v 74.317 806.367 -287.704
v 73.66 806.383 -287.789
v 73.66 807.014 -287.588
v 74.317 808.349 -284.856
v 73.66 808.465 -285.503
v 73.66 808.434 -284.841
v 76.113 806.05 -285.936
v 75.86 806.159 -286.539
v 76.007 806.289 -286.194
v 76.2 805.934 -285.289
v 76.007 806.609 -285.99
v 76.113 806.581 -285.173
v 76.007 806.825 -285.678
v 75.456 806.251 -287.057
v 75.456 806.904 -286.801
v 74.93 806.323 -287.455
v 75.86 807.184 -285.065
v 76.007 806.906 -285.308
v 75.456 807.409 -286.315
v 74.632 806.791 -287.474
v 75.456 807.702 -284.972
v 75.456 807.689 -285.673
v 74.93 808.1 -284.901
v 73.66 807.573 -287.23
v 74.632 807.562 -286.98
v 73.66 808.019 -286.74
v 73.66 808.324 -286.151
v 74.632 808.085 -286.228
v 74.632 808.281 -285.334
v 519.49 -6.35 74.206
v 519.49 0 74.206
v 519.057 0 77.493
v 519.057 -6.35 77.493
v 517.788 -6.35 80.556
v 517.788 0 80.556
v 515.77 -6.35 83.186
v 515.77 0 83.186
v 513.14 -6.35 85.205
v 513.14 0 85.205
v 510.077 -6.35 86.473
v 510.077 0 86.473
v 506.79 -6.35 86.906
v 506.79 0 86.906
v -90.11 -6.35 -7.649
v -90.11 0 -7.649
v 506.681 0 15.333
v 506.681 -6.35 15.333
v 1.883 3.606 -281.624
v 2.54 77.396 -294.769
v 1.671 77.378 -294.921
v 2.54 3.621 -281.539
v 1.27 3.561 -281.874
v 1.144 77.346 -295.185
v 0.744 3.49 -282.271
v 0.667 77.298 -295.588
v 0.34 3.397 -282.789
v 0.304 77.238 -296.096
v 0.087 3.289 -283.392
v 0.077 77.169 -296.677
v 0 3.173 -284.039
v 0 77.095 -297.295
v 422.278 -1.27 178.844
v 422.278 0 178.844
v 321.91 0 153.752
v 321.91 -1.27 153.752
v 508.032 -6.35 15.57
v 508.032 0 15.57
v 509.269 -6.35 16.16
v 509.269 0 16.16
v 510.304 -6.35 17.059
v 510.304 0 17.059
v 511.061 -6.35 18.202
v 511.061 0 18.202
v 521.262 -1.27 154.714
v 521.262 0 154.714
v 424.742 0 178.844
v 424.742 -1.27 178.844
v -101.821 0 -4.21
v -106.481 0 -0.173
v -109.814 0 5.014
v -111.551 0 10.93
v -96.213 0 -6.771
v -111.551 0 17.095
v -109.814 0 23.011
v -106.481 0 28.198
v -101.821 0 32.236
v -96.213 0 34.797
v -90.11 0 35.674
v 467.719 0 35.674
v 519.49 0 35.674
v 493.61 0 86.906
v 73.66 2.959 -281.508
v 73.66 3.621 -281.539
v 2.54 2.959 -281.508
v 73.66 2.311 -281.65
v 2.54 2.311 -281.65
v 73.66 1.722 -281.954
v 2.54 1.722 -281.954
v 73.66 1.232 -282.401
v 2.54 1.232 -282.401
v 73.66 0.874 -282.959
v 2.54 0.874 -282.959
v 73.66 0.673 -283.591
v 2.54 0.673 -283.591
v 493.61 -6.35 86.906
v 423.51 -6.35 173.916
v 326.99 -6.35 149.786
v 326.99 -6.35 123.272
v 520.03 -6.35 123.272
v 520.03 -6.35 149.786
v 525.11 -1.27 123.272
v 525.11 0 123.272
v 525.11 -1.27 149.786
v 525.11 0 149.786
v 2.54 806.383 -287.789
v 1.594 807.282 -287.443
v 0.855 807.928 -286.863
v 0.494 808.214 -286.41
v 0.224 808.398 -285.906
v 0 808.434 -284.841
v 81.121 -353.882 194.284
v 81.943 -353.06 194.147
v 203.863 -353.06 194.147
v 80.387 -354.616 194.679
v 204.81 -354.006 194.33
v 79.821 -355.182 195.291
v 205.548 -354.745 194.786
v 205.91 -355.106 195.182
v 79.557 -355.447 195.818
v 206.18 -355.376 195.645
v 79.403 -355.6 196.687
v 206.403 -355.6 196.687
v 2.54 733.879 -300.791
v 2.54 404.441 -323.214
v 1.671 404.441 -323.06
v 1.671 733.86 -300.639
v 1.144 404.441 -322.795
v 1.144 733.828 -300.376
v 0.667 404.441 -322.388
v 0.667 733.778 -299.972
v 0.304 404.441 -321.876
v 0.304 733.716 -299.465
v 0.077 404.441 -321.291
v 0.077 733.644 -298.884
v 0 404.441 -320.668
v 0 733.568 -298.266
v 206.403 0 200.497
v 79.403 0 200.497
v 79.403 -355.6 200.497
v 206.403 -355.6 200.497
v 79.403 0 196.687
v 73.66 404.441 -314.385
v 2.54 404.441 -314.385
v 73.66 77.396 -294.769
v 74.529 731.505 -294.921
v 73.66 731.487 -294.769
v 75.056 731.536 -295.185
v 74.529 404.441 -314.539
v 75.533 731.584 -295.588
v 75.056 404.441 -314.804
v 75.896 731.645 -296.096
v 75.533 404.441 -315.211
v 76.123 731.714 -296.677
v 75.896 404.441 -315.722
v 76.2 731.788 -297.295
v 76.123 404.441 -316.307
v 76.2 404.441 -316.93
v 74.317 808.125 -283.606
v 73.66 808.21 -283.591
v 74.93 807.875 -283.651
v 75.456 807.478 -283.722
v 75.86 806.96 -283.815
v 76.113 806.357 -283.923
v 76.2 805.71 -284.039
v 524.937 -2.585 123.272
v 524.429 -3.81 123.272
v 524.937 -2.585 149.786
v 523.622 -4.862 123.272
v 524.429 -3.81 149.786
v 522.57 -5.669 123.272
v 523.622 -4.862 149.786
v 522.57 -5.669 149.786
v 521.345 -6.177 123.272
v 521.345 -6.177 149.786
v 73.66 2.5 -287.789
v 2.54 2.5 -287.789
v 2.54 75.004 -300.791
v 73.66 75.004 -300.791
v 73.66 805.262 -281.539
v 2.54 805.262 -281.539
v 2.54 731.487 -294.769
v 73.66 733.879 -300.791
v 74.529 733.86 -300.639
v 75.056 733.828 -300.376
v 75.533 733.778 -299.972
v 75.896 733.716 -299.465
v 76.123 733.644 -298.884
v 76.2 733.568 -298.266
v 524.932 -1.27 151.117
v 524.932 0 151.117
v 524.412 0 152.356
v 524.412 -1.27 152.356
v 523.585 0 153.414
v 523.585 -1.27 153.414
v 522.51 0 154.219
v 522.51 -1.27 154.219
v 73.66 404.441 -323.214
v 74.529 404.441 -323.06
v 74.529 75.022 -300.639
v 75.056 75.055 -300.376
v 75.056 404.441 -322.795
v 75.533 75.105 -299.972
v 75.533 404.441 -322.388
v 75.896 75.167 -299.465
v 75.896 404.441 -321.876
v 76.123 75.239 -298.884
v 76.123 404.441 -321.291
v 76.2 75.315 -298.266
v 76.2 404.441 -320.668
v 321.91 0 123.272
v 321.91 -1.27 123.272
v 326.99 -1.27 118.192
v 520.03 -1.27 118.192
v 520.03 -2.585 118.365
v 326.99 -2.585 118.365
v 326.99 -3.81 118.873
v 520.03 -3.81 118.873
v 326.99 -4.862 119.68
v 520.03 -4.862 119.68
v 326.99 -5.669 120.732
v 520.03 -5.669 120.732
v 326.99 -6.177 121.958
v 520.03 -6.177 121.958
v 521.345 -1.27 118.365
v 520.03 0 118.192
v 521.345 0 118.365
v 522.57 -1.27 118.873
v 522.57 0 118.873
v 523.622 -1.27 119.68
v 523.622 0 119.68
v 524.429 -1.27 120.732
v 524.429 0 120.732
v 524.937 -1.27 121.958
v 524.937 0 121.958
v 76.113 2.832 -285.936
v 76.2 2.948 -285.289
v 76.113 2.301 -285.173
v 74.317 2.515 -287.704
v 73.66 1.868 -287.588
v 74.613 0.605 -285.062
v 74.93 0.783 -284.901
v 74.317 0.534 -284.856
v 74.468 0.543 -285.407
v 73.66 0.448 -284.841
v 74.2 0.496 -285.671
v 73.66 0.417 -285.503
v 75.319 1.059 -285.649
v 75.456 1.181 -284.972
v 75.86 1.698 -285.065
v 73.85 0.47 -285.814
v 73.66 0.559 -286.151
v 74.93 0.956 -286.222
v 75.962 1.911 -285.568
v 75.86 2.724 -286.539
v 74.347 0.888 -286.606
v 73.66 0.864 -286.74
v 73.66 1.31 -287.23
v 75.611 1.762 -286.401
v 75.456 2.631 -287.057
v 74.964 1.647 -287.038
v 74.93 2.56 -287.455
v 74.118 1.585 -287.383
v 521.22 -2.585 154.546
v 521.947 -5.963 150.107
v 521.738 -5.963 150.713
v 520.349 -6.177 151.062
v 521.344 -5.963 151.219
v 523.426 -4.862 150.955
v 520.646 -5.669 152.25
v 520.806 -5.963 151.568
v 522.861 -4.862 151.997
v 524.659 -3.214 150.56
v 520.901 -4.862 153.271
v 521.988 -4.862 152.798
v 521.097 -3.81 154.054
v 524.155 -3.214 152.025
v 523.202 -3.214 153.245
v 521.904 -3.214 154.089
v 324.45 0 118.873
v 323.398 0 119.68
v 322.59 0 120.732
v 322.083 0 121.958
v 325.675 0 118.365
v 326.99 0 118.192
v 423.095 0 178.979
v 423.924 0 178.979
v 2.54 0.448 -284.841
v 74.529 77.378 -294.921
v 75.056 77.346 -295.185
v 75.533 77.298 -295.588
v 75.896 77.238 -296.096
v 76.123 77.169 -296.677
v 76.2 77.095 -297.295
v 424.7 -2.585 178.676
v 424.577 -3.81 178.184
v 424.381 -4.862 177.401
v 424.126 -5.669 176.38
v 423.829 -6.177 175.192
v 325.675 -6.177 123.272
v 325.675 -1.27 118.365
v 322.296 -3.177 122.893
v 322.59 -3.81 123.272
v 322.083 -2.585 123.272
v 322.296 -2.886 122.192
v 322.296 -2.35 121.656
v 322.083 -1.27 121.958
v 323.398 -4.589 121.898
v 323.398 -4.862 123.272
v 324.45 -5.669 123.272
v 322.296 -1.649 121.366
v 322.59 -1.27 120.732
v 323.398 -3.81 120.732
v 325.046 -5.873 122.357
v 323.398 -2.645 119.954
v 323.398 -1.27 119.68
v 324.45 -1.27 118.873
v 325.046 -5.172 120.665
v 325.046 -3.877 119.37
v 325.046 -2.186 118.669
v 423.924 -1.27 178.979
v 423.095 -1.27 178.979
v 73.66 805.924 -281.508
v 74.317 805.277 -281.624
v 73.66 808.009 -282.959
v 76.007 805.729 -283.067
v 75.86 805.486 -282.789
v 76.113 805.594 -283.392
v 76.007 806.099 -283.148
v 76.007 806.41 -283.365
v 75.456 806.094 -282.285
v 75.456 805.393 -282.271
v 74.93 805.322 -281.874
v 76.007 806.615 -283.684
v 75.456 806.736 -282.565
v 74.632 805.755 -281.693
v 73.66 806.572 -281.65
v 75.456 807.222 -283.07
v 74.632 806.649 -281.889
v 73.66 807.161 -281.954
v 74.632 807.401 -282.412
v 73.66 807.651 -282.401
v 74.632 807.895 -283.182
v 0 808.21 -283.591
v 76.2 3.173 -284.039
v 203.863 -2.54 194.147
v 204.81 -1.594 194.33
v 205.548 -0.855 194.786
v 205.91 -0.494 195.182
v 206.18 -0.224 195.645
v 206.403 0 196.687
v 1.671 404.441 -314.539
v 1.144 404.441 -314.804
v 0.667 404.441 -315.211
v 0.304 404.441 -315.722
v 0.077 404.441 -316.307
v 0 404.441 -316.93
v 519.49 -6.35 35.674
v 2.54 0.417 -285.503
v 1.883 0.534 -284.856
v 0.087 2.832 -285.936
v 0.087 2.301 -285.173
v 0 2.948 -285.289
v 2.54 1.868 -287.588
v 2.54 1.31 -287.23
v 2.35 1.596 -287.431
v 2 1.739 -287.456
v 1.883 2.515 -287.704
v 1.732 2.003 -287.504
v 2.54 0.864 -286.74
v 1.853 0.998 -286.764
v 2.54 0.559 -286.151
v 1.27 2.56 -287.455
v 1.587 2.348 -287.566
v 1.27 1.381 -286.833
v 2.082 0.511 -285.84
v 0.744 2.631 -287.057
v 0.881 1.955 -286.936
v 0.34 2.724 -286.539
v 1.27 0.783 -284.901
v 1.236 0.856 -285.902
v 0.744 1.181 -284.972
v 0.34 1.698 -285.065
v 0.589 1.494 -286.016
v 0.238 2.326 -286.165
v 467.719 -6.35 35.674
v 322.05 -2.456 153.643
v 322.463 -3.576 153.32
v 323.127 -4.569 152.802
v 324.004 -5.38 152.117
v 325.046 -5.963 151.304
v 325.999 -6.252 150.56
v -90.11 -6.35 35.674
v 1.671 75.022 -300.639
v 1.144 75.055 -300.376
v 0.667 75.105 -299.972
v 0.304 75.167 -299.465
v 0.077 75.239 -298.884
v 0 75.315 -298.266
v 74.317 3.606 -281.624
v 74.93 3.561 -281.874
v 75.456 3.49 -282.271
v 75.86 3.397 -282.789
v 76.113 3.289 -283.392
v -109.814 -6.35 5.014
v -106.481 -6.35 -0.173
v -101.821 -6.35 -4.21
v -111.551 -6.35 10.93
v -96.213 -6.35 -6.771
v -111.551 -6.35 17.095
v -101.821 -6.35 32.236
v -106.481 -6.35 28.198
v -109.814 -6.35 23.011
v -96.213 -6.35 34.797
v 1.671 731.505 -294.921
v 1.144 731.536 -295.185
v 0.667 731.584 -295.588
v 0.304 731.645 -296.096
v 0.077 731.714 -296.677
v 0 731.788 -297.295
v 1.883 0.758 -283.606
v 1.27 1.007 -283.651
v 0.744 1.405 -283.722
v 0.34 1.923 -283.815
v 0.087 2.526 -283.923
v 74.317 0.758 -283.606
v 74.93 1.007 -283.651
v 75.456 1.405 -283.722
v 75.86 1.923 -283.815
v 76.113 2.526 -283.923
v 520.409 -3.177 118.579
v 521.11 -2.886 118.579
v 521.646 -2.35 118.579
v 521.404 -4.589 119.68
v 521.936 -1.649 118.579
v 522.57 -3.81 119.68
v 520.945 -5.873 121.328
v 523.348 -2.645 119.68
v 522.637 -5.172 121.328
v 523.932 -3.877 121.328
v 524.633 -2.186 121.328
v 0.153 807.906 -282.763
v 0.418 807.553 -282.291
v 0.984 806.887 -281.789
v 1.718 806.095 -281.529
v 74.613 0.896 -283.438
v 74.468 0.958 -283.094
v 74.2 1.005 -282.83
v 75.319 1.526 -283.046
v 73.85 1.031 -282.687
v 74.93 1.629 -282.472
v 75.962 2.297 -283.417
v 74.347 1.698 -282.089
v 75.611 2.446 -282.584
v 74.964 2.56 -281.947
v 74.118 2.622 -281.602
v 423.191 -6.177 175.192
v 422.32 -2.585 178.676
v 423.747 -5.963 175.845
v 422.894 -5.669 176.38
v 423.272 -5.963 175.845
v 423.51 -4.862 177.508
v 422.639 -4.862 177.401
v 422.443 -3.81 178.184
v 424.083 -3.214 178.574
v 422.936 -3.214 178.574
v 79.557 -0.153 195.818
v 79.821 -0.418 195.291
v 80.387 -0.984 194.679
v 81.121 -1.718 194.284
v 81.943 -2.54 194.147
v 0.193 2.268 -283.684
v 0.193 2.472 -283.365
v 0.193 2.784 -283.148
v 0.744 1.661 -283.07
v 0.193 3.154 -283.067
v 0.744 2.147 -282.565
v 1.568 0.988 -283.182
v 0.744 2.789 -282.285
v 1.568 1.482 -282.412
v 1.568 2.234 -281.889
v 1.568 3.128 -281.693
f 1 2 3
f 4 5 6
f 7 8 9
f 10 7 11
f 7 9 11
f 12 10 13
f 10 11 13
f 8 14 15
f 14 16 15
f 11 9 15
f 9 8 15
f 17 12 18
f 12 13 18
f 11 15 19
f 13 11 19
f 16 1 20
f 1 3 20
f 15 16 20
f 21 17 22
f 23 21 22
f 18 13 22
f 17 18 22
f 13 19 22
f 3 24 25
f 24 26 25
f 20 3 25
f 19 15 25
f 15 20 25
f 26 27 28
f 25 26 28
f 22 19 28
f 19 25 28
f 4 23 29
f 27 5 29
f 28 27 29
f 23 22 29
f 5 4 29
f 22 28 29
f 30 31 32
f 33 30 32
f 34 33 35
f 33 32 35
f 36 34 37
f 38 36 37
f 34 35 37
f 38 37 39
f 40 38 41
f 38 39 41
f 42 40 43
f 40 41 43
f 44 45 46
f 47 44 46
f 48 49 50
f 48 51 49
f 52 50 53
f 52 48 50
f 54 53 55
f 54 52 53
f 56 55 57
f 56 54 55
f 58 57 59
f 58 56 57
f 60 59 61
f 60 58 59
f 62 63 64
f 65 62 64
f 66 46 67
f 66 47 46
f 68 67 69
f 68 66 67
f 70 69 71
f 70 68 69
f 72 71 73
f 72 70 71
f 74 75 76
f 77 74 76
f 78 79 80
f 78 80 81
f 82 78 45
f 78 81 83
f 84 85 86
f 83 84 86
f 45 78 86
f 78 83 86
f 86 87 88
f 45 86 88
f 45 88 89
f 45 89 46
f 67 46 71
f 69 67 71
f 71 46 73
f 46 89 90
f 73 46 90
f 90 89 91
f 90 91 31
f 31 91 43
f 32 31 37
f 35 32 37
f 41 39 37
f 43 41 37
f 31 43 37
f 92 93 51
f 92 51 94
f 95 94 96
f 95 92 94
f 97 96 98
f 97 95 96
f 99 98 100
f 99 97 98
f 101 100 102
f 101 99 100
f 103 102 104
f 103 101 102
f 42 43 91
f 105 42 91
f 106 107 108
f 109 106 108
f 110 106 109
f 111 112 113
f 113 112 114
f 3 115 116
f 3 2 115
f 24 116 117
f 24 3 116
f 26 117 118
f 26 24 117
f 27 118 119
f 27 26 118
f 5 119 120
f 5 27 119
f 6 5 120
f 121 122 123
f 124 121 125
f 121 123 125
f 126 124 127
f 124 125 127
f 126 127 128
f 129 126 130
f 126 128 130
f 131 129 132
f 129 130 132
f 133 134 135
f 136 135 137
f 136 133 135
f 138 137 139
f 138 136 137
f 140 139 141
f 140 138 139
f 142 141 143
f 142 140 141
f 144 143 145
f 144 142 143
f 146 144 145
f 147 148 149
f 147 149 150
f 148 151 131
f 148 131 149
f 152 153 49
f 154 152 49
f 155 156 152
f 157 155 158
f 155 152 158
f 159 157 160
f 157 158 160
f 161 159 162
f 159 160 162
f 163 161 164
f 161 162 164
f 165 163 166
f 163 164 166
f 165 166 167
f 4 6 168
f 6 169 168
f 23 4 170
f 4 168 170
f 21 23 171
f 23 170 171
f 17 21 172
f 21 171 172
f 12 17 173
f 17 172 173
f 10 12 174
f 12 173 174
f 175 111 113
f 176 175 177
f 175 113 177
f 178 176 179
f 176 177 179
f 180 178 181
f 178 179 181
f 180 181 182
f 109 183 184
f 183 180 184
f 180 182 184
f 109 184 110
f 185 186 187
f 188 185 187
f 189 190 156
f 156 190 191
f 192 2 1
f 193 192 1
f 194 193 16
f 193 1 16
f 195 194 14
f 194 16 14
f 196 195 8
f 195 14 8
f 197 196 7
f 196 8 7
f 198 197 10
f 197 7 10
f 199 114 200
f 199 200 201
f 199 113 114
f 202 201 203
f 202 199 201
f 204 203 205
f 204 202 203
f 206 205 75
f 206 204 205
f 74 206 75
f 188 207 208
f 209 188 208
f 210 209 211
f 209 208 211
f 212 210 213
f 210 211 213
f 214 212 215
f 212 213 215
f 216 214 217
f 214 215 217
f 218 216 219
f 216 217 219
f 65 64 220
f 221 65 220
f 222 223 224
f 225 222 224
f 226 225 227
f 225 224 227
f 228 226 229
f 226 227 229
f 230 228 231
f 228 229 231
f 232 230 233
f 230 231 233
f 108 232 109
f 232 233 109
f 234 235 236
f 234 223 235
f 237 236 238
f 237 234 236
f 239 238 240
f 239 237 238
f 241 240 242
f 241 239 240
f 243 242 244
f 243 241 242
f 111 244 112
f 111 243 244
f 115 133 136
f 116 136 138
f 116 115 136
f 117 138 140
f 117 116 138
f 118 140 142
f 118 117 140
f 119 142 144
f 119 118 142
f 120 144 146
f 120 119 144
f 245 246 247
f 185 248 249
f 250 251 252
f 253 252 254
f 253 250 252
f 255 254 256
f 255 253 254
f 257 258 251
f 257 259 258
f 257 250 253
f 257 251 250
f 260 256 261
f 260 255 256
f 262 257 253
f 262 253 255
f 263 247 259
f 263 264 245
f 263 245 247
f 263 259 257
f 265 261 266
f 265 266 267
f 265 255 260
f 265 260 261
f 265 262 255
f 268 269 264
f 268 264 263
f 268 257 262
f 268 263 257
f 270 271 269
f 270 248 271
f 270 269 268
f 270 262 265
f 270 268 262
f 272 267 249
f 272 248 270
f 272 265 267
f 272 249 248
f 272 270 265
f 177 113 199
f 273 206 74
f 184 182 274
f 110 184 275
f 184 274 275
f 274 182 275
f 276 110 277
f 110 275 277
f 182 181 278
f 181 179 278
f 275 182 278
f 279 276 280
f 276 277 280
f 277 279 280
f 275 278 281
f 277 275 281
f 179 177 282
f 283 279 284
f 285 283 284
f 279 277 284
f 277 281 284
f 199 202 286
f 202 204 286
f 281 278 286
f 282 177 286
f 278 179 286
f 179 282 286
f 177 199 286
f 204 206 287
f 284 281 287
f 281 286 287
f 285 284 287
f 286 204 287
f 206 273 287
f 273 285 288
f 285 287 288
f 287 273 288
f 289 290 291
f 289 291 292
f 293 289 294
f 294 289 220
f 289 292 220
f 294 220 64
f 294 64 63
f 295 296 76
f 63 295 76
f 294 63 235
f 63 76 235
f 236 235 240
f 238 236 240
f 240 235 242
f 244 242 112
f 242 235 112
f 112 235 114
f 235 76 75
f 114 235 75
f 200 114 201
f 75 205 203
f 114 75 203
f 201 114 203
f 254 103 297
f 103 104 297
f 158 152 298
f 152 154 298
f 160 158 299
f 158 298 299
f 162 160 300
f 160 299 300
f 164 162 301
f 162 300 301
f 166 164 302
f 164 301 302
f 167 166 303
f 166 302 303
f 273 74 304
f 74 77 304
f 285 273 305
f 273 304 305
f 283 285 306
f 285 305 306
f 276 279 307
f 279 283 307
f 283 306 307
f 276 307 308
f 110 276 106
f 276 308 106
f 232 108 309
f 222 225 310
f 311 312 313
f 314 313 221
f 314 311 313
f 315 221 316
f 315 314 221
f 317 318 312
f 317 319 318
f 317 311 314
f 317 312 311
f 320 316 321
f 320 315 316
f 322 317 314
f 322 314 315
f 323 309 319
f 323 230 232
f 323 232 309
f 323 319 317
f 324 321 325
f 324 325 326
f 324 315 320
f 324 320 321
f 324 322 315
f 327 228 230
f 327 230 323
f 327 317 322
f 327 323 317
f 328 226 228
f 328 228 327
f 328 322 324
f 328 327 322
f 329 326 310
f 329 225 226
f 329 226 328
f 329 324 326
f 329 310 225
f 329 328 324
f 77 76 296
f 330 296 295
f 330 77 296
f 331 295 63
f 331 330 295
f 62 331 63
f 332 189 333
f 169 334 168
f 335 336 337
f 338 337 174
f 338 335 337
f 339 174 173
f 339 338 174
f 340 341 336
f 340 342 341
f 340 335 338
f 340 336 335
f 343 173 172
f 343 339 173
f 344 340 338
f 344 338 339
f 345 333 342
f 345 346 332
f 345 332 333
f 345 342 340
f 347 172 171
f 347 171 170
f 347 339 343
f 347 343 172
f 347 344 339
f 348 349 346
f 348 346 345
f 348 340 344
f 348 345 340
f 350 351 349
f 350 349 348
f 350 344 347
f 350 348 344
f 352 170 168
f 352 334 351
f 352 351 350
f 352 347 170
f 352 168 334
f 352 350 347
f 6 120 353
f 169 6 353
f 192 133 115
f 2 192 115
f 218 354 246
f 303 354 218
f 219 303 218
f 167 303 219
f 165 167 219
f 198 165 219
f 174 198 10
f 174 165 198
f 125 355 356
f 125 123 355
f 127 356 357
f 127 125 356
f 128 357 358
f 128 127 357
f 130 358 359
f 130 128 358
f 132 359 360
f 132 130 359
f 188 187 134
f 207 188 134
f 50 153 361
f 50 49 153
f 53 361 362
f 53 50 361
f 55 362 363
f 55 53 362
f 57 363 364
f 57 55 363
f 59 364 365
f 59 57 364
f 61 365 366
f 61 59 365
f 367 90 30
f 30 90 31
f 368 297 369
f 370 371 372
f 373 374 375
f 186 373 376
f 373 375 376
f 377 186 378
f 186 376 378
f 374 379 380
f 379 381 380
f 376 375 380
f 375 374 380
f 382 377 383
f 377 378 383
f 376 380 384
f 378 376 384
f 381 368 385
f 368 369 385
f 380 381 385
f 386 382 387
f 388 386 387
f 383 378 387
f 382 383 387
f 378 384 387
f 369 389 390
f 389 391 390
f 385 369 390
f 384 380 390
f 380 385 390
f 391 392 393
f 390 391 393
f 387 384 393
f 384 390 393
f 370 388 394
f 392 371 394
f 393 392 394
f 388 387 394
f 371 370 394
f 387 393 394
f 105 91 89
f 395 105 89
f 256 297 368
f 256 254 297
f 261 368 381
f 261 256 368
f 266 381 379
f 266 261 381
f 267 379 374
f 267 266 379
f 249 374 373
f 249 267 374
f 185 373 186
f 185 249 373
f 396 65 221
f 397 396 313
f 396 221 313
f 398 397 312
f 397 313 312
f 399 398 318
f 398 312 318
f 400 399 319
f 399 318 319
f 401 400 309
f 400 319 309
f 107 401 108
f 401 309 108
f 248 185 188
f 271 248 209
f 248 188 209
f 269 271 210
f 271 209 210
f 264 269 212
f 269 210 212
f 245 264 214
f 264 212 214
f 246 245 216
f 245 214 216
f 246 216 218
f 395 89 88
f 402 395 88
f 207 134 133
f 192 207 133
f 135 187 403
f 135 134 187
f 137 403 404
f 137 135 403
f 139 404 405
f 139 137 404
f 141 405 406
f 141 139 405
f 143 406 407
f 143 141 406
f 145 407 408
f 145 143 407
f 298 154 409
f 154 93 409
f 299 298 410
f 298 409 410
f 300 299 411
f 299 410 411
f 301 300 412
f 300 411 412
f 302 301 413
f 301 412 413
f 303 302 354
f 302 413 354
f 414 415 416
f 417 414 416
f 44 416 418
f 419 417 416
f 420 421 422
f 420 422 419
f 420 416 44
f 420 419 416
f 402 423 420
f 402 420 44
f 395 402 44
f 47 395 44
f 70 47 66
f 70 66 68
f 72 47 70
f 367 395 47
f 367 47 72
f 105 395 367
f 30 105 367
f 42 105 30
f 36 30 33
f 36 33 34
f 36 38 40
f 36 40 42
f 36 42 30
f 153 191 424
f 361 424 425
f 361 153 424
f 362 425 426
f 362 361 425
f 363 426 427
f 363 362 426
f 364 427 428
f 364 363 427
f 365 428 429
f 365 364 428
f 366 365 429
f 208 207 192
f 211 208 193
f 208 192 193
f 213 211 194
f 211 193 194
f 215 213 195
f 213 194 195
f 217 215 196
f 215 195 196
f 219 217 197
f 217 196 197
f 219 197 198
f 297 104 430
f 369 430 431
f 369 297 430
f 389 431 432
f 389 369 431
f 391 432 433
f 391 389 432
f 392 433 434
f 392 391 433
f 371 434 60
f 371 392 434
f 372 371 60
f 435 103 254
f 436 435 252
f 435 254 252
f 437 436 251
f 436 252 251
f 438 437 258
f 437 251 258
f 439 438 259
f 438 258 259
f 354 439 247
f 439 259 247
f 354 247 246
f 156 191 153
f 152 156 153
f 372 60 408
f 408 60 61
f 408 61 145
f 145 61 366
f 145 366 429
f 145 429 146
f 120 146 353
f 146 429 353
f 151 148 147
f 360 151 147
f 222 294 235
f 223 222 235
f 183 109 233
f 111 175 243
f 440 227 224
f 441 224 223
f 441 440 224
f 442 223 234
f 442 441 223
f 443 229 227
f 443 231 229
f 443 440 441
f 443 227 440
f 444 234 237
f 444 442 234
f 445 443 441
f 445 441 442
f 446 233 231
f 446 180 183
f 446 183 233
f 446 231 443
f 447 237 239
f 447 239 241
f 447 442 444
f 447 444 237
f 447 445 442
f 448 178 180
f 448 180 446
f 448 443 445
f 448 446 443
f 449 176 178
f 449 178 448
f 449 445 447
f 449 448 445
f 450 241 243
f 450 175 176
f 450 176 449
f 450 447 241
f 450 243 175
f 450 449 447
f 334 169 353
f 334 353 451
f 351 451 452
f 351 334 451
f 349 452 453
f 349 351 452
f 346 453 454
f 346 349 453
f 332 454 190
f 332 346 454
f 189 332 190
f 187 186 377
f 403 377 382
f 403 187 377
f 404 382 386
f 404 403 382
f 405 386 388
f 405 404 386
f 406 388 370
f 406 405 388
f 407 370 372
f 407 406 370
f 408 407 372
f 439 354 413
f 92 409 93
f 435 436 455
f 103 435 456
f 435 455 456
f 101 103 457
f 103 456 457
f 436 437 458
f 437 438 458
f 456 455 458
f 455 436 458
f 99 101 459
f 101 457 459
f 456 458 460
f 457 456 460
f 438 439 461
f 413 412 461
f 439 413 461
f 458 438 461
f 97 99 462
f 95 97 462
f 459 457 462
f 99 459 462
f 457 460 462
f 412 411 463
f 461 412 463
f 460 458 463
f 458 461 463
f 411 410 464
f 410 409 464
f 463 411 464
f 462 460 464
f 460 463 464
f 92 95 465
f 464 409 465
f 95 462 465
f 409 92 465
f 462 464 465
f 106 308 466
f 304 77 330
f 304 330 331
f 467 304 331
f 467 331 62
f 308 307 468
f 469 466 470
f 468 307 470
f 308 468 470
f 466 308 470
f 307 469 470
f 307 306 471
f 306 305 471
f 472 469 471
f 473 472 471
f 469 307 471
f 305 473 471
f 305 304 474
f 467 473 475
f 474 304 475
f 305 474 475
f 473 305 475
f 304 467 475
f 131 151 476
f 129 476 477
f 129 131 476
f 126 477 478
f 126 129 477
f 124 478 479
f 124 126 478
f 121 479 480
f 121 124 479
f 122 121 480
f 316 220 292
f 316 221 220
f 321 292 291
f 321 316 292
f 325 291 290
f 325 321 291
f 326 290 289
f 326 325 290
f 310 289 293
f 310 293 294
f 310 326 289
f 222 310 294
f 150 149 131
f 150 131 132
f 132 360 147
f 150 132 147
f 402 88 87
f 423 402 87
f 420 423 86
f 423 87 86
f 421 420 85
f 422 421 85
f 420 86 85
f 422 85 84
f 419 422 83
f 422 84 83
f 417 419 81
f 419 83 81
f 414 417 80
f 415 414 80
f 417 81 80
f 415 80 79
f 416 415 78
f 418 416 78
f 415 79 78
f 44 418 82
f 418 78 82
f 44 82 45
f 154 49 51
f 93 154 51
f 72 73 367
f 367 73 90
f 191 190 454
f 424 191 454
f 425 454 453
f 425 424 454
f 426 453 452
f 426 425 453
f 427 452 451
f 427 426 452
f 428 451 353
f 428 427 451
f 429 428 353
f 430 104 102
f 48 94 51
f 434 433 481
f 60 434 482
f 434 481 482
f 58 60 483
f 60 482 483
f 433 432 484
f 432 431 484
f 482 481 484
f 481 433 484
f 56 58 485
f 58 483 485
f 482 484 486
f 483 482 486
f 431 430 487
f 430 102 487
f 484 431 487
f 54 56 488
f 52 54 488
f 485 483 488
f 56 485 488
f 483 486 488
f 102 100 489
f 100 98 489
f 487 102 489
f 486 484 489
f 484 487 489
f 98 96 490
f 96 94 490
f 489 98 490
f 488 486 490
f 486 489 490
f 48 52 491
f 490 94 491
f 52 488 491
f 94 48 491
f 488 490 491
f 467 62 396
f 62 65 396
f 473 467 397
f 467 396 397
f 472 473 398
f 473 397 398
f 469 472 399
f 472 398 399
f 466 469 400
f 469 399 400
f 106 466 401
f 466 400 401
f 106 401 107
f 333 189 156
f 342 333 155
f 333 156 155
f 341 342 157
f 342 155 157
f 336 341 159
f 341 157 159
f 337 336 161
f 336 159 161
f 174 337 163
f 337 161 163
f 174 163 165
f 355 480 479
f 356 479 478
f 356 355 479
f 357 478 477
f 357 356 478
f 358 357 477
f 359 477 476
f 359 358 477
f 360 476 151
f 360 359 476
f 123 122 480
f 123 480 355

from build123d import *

# Parameters (mm, degrees)
F3_DEPTH = 6.35
F2_W     = 127
F2_H     = 6.35
F4_DEPTH = 355.6
F5_R     = 2.54
F6_DEPTH = 6.35
F8_DEPTH = 76.2
F9_R     = 2.54
F10_R    = 5.08
F10_2_R  = 5.08


with BuildPart() as f3:
    # F0 (on Front) → F3 (new body)
    with BuildSketch(Plane.XZ):
        with BuildLine():
            Line((445.178494, 35.674188), (-90.110242, 35.674188))
            ThreePointArc((-90.110242, 35.674188), (-111.771701, 14.012728), (-90.110242, -7.648731))
            Line((-90.110242, -7.648731), (509.733975, 15.450746))
            Line((509.733975, 15.450746), (519.489758, 35.674188))
            Line((519.489758, 35.674188), (519.489758, 74.205986))
            ThreePointArc((519.489758, 74.205986), (515.770014, 83.186242), (506.789758, 86.905986))
            Line((506.789758, 86.905986), (493.610442, 86.905986))
            Line((493.610442, 86.905986), (467.718842, 35.674188))
            Line((467.718842, 35.674188), (445.178494, 35.674188))
        make_face()
    extrude(amount=F3_DEPTH)

    # F10#2
    f10_2_edges = [f3.edges().sort_by_distance(p)[0] for p in [
        (509.733975, -3.175, 15.450746),
    ]]
    fillet(f10_2_edges, radius=F10_2_R)


with BuildPart() as f4:
    # F2 (on Front) → F4 (new body)
    with BuildSketch(Plane.XZ):
        with Locations((142.903406, 197.321931)):
            Rectangle(F2_W, F2_H)
    extrude(amount=F4_DEPTH)

    # F5
    f5_edges = [f4.edges().sort_by_distance(p)[0] for p in [
        (206.403406, -177.8, 194.146931),
        (79.403406, -177.8, 194.146931),
        (142.903406, -355.6, 194.146931),
        (142.903406, 0, 194.146931),
    ]]
    fillet(f5_edges, radius=F5_R)


with BuildPart() as f6:
    # F1 (on Front) → F6 (new body)
    with BuildSketch(Plane.XZ):
        Polygon((321.909756, 153.752377), (321.909756, 118.192377), (423.509756, 118.192377), (423.509756, 179.152377), align=None)
        Polygon((423.509756, 179.152377), (423.509756, 118.192377), (525.109756, 118.192377), (525.109756, 153.752377), align=None)
    extrude(amount=F6_DEPTH)

    # F10
    f10_edges = [f6.edges().sort_by_distance(p)[0] for p in [
        (525.109756, -6.35, 135.972377),
        (372.709756, -6.35, 166.452377),
        (423.509756, -3.175, 179.152377),
        (474.309756, -6.35, 166.452377),
        (423.509756, -6.35, 118.192377),
        (321.909756, -6.35, 135.972377),
        (321.909756, -3.175, 118.192377),
        (525.109756, -3.175, 118.192377),
        (525.109756, -3.175, 153.752377),
    ]]
    fillet(f10_edges, radius=F10_R)


with BuildPart() as f8:
    # F7 (on Right) → F8 (new body)
    with BuildSketch(Plane.YZ):
        Polygon((75.003583, -300.791129), (404.441396, -323.213599), (404.441396, -314.385496), (77.396057, -294.768867), (1.120834, -281.090828), (0, -287.341127), align=None)
        Polygon((404.441396, -314.385496), (404.441396, -323.213599), (733.879209, -300.791129), (808.882792, -287.341127), (807.761959, -281.090828), (731.486735, -294.768867), align=None)
    extrude(amount=F8_DEPTH)

    # F9
    f9_edges = [f8.edges().sort_by_distance(p)[0] for p in [
        (38.1, 807.761959, -281.090828),
        (76.2, 769.624347, -287.929848),
        (76.2, 567.964066, -304.577181),
        (76.2, 240.918726, -304.577181),
        (38.1, 808.882792, -287.341127),
        (76.2, 771.381001, -294.066128),
        (76.2, 808.322375, -284.215977),
        (76.2, 569.160303, -312.002364),
        (76.2, 239.722489, -312.002364),
        (76.2, 37.501791, -294.066128),
        (76.2, 39.258445, -287.929848),
        (76.2, 0.560417, -284.215977),
        (38.1, 1.120834, -281.090828),
        (0, 0.560417, -284.215977),
        (38.1, 0, -287.341127),
        (0, 567.964066, -304.577181),
        (0, 569.160303, -312.002364),
        (0, 239.722489, -312.002364),
        (0, 240.918726, -304.577181),
        (0, 39.258445, -287.929848),
        (0, 37.501791, -294.066128),
        (0, 771.381001, -294.066128),
        (0, 769.624347, -287.929848),
    ]]
    fillet(f9_edges, radius=F9_R)


solid = Compound([f3.part, f4.part, f6.part, f8.part])
